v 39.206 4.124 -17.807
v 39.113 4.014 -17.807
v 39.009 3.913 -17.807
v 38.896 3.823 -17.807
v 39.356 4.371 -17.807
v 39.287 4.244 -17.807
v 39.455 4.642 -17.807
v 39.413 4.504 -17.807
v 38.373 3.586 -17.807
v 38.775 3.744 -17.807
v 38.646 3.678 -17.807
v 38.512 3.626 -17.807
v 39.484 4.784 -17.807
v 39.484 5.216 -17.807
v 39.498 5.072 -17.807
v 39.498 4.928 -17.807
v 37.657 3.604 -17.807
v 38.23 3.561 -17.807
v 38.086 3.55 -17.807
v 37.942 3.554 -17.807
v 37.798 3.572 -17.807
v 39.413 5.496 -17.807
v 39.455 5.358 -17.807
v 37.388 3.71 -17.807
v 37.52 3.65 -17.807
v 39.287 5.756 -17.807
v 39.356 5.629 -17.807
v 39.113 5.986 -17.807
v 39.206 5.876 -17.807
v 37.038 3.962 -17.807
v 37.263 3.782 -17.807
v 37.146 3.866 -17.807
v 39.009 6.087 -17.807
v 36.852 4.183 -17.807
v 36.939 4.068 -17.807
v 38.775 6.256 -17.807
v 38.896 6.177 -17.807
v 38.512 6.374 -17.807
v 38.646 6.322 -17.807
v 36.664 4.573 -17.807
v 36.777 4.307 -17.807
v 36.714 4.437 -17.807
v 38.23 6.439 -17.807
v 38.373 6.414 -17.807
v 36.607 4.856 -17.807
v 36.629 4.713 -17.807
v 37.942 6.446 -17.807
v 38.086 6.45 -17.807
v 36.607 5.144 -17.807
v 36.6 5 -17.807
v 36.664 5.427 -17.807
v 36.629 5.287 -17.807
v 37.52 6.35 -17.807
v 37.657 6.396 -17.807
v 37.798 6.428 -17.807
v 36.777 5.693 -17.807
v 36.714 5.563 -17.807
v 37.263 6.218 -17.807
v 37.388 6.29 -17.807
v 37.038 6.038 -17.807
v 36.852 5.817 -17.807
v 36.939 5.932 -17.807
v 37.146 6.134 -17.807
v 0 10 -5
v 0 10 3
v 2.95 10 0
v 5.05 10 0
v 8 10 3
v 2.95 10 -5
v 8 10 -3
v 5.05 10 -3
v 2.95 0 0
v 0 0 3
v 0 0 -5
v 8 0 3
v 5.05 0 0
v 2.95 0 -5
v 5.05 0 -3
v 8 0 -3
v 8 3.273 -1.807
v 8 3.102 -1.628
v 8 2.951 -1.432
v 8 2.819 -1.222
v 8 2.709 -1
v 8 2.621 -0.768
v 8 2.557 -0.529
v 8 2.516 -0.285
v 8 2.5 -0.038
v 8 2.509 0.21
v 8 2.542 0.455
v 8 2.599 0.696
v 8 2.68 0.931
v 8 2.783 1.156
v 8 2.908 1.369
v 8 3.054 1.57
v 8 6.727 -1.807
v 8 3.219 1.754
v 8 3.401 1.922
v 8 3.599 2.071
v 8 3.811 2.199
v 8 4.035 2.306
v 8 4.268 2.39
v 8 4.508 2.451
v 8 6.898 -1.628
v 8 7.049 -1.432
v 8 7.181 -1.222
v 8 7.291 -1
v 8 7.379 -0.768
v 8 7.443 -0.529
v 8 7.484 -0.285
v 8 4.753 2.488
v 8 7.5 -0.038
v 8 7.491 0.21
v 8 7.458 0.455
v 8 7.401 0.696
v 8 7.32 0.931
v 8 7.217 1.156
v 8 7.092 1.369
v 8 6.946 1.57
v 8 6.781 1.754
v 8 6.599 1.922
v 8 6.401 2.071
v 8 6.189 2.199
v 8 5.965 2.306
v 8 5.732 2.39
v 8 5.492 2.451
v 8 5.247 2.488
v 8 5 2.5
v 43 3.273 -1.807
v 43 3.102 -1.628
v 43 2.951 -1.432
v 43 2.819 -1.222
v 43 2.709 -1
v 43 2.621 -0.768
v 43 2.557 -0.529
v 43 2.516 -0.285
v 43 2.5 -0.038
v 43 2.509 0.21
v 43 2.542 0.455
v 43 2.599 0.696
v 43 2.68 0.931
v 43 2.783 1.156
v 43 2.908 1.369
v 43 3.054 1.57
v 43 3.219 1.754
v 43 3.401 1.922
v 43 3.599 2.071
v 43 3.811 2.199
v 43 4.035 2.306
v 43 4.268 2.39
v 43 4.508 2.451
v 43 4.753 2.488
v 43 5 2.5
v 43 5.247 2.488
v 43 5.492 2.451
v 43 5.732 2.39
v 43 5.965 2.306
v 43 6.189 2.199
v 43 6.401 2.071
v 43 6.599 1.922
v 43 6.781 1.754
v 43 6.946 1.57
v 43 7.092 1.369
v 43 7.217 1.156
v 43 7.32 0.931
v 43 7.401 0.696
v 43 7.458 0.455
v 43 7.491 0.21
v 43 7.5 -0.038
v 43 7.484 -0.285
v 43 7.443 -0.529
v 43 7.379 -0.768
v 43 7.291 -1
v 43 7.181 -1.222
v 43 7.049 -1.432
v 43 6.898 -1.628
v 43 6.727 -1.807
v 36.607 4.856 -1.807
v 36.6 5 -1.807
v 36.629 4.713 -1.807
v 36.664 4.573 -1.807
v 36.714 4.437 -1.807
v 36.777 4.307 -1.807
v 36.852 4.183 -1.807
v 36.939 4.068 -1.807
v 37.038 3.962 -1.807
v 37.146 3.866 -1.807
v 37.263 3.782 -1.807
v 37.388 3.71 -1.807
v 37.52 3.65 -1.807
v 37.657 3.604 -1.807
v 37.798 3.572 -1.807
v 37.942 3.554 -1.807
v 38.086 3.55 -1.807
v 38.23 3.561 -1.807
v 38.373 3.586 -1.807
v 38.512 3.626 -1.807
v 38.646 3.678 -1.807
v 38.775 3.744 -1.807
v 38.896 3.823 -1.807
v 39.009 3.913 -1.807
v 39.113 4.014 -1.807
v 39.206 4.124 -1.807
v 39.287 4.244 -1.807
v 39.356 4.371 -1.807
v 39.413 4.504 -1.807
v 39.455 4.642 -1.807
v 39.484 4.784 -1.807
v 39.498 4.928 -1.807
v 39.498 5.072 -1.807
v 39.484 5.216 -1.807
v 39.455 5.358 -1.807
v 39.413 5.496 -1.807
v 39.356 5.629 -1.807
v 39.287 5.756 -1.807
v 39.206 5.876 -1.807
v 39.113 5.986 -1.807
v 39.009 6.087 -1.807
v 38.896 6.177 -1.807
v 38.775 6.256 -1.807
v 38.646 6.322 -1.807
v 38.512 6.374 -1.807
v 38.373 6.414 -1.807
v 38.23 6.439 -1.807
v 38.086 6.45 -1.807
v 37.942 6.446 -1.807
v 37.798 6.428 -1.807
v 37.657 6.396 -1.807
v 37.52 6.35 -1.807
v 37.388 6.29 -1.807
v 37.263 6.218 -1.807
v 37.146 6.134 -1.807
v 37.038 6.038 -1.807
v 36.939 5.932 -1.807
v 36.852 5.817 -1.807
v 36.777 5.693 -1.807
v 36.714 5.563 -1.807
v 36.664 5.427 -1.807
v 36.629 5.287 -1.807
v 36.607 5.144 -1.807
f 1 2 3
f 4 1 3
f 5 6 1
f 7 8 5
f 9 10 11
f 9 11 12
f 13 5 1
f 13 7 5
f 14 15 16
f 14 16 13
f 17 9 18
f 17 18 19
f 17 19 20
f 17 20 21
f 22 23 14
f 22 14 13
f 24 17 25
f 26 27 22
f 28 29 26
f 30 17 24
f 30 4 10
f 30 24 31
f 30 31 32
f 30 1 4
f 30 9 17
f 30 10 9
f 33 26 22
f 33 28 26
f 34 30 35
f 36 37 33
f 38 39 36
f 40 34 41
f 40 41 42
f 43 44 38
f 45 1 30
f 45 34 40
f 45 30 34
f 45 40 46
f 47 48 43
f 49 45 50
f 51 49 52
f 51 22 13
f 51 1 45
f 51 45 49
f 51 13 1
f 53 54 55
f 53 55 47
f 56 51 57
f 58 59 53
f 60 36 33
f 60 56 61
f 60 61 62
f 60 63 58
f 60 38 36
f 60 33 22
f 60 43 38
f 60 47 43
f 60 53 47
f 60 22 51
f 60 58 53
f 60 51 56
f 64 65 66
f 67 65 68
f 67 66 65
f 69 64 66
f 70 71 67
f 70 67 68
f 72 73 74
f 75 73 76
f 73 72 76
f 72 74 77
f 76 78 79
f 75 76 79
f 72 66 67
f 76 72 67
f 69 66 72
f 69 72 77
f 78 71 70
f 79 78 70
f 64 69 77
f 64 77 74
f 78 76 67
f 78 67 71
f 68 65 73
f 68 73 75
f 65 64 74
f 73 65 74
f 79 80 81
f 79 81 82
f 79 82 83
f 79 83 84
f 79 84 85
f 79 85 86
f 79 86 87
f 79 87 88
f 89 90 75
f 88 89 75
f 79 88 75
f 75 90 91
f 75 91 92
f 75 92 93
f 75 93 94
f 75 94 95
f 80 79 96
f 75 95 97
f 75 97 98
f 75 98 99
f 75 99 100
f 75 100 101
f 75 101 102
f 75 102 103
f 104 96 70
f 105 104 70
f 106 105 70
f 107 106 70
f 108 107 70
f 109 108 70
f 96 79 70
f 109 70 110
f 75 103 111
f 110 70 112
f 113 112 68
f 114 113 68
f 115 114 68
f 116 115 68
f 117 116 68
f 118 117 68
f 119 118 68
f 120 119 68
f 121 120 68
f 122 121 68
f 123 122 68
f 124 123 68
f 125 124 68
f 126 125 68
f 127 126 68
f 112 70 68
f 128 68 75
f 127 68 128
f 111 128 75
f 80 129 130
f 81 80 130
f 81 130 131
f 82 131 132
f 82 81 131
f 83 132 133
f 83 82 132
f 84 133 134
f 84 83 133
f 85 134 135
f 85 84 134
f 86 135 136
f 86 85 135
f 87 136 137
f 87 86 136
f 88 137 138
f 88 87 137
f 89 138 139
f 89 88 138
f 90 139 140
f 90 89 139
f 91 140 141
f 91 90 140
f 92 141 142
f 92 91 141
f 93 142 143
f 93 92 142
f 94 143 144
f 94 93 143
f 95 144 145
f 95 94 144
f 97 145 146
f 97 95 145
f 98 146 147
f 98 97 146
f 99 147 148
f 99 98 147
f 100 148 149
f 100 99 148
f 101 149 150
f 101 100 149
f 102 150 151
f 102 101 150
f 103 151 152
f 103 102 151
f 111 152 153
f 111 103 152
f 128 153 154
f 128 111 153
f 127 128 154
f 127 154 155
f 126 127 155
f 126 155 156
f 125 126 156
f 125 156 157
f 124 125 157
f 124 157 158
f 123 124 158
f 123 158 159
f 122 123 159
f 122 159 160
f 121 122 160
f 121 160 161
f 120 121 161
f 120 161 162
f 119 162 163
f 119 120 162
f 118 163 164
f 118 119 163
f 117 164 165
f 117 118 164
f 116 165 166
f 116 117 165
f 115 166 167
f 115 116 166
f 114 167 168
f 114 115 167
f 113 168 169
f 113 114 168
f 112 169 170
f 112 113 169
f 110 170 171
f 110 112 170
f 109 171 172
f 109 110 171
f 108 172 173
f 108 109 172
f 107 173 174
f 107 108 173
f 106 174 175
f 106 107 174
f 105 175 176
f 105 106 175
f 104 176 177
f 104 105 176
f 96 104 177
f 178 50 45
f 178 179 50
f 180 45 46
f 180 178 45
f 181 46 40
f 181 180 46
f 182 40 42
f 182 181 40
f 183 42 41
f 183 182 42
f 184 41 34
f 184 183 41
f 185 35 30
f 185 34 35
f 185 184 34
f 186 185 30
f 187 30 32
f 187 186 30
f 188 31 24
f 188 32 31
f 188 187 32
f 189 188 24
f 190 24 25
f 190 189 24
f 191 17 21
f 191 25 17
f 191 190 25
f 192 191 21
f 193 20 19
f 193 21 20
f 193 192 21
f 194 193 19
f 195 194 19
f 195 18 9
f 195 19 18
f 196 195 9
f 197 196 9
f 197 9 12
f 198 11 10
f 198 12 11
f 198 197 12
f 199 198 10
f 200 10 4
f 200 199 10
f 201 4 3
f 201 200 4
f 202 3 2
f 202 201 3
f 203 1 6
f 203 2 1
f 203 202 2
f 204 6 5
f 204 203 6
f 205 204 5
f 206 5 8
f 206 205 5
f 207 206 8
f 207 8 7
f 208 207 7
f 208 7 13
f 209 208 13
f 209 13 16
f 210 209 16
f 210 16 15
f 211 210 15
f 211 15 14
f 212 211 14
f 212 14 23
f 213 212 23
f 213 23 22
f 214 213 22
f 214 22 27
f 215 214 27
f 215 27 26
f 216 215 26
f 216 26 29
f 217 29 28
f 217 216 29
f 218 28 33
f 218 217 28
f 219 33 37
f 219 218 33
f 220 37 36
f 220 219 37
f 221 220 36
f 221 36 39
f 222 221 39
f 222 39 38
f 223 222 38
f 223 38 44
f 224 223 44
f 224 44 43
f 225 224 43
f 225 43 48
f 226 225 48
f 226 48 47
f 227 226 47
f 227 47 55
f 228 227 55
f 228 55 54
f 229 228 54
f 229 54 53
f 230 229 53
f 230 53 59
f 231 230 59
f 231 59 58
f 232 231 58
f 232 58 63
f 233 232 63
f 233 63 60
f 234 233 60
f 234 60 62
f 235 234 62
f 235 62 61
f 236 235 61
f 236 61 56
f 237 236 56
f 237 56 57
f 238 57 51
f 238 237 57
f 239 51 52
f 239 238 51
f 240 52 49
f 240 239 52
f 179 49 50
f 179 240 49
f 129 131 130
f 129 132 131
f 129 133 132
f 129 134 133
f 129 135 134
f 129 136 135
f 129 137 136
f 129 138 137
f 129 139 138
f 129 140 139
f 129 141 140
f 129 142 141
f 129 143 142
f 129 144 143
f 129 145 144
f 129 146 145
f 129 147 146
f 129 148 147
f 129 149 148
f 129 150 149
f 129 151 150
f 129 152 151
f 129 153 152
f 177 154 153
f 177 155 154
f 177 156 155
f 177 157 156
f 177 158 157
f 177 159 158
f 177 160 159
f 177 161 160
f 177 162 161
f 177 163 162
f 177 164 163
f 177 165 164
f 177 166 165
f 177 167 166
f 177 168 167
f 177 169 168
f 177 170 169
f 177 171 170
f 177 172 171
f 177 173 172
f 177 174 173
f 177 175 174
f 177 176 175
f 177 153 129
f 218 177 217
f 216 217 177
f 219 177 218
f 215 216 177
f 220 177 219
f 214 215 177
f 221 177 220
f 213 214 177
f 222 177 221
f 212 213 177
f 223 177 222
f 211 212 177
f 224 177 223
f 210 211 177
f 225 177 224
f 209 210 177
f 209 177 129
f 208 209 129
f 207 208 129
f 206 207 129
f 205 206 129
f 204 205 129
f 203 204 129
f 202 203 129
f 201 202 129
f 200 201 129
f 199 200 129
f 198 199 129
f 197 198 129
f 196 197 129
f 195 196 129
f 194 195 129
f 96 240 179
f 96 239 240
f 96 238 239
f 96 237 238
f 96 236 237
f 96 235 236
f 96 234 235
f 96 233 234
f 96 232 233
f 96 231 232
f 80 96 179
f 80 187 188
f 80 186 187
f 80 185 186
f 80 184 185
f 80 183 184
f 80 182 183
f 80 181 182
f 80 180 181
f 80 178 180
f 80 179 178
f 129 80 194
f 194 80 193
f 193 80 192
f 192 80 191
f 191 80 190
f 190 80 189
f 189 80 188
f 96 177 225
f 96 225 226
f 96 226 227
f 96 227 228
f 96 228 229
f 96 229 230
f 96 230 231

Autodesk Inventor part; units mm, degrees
ref_plane "YZ Plane" through (0, 0, 0) normal (1, 0, 0) x (0, 1, 0)
ref_plane "XZ Plane" through (0, 0, 0) normal (0, 1, 0) x (-1, 0, 0)
ref_plane "XY Plane" through (0, 0, 0) normal (0, 0, 1) x (1, 0, 0)
sketch "Sketch1" plane through (0, 0, 0) normal (0, 0, 1) x (1, 0, 0)
  line L0 (0, 0) -> (8, 0)
  line L1 (8, 0) -> (8, 10)
  line L2 (8, 10) -> (0, 10)
  line L3 (0, 10) -> (0, 0)
  dimension "d0" = 8
  dimension "d1" = 10
extrude "Extrusion1" add sketch "Sketch1" along normal blind 3
sketch "Sketch2" plane through (8, 0, 0) normal (1, 0, 0) x (0, 0, -1)
  point P0 (0, 0)
sketch "Sketch3" plane through (0, 10, 0) normal (0, 1, 0) x (1, 0, 0)
  line L0 (0, 0) -> (2.95, 0)
  line L1 (2.95, 0) -> (2.95, 5)
  line L2 (2.95, 5) -> (0, 5)
  line L3 (0, 5) -> (0, 0)
  line L4 (8, 0) -> (0, 0) projected
  line L5 (8, 0) -> (8, -3) projected
  line L6 (8, 0) -> (5.05, 0)
  line L7 (5.05, 0) -> (5.05, 3)
  line L8 (5.05, 3) -> (8, 3)
  line L9 (8, 3) -> (8, 0)
  point P0 (5.05, 5)
  dimension "d4" = 2.95
  dimension "d10" = 2.95
  dimension "d11" = 3
extrude "Extrusion2" add sketch "Sketch3" against normal blind 10 contours L3 L2 L1 L0
sketch "Sketch4" plane through (8, 0, 3) normal (1, 0, 0) x (0, 0, -1)
  point P0 (3, 0)
extrude "Extrusion3" add sketch "Sketch3" against normal blind 10 contours L7 L8 L9 L4
sketch "Sketch5" plane through (8, 0, 3) normal (1, 0, 0) x (0, 0, -1)
  line L0 (3, 0) -> (3, 10) projected
  arc A0 (4.8073, 6.7273) -> (4.8073, 3.2727) centre (3, 5) ccw
  line L1 (4.8073, 6.7273) -> (4.8073, 3.2727)
  dimension "d14" = 5
extrude "Extrusion4" add sketch "Sketch5" along normal blind 35
sketch "Sketch6" plane through (8, 3.2727, -1.8073) normal (0, 0, -1) x (-1, 0, 0)
  line L0 (0, 3.4546) -> (0, 0) projected
  line L1 (0, 1.7273) -> (-30.05, 1.7273)
  circle A0 centre (-30.05, 1.7273) radius 1.45
  point P0 (8, -3.2727)
  dimension "d17" = 30.05
  dimension "d18" = 2.9
extrude "Extrusion5" add sketch "Sketch6" along normal blind 16
properties part number "Grip Stopper"
